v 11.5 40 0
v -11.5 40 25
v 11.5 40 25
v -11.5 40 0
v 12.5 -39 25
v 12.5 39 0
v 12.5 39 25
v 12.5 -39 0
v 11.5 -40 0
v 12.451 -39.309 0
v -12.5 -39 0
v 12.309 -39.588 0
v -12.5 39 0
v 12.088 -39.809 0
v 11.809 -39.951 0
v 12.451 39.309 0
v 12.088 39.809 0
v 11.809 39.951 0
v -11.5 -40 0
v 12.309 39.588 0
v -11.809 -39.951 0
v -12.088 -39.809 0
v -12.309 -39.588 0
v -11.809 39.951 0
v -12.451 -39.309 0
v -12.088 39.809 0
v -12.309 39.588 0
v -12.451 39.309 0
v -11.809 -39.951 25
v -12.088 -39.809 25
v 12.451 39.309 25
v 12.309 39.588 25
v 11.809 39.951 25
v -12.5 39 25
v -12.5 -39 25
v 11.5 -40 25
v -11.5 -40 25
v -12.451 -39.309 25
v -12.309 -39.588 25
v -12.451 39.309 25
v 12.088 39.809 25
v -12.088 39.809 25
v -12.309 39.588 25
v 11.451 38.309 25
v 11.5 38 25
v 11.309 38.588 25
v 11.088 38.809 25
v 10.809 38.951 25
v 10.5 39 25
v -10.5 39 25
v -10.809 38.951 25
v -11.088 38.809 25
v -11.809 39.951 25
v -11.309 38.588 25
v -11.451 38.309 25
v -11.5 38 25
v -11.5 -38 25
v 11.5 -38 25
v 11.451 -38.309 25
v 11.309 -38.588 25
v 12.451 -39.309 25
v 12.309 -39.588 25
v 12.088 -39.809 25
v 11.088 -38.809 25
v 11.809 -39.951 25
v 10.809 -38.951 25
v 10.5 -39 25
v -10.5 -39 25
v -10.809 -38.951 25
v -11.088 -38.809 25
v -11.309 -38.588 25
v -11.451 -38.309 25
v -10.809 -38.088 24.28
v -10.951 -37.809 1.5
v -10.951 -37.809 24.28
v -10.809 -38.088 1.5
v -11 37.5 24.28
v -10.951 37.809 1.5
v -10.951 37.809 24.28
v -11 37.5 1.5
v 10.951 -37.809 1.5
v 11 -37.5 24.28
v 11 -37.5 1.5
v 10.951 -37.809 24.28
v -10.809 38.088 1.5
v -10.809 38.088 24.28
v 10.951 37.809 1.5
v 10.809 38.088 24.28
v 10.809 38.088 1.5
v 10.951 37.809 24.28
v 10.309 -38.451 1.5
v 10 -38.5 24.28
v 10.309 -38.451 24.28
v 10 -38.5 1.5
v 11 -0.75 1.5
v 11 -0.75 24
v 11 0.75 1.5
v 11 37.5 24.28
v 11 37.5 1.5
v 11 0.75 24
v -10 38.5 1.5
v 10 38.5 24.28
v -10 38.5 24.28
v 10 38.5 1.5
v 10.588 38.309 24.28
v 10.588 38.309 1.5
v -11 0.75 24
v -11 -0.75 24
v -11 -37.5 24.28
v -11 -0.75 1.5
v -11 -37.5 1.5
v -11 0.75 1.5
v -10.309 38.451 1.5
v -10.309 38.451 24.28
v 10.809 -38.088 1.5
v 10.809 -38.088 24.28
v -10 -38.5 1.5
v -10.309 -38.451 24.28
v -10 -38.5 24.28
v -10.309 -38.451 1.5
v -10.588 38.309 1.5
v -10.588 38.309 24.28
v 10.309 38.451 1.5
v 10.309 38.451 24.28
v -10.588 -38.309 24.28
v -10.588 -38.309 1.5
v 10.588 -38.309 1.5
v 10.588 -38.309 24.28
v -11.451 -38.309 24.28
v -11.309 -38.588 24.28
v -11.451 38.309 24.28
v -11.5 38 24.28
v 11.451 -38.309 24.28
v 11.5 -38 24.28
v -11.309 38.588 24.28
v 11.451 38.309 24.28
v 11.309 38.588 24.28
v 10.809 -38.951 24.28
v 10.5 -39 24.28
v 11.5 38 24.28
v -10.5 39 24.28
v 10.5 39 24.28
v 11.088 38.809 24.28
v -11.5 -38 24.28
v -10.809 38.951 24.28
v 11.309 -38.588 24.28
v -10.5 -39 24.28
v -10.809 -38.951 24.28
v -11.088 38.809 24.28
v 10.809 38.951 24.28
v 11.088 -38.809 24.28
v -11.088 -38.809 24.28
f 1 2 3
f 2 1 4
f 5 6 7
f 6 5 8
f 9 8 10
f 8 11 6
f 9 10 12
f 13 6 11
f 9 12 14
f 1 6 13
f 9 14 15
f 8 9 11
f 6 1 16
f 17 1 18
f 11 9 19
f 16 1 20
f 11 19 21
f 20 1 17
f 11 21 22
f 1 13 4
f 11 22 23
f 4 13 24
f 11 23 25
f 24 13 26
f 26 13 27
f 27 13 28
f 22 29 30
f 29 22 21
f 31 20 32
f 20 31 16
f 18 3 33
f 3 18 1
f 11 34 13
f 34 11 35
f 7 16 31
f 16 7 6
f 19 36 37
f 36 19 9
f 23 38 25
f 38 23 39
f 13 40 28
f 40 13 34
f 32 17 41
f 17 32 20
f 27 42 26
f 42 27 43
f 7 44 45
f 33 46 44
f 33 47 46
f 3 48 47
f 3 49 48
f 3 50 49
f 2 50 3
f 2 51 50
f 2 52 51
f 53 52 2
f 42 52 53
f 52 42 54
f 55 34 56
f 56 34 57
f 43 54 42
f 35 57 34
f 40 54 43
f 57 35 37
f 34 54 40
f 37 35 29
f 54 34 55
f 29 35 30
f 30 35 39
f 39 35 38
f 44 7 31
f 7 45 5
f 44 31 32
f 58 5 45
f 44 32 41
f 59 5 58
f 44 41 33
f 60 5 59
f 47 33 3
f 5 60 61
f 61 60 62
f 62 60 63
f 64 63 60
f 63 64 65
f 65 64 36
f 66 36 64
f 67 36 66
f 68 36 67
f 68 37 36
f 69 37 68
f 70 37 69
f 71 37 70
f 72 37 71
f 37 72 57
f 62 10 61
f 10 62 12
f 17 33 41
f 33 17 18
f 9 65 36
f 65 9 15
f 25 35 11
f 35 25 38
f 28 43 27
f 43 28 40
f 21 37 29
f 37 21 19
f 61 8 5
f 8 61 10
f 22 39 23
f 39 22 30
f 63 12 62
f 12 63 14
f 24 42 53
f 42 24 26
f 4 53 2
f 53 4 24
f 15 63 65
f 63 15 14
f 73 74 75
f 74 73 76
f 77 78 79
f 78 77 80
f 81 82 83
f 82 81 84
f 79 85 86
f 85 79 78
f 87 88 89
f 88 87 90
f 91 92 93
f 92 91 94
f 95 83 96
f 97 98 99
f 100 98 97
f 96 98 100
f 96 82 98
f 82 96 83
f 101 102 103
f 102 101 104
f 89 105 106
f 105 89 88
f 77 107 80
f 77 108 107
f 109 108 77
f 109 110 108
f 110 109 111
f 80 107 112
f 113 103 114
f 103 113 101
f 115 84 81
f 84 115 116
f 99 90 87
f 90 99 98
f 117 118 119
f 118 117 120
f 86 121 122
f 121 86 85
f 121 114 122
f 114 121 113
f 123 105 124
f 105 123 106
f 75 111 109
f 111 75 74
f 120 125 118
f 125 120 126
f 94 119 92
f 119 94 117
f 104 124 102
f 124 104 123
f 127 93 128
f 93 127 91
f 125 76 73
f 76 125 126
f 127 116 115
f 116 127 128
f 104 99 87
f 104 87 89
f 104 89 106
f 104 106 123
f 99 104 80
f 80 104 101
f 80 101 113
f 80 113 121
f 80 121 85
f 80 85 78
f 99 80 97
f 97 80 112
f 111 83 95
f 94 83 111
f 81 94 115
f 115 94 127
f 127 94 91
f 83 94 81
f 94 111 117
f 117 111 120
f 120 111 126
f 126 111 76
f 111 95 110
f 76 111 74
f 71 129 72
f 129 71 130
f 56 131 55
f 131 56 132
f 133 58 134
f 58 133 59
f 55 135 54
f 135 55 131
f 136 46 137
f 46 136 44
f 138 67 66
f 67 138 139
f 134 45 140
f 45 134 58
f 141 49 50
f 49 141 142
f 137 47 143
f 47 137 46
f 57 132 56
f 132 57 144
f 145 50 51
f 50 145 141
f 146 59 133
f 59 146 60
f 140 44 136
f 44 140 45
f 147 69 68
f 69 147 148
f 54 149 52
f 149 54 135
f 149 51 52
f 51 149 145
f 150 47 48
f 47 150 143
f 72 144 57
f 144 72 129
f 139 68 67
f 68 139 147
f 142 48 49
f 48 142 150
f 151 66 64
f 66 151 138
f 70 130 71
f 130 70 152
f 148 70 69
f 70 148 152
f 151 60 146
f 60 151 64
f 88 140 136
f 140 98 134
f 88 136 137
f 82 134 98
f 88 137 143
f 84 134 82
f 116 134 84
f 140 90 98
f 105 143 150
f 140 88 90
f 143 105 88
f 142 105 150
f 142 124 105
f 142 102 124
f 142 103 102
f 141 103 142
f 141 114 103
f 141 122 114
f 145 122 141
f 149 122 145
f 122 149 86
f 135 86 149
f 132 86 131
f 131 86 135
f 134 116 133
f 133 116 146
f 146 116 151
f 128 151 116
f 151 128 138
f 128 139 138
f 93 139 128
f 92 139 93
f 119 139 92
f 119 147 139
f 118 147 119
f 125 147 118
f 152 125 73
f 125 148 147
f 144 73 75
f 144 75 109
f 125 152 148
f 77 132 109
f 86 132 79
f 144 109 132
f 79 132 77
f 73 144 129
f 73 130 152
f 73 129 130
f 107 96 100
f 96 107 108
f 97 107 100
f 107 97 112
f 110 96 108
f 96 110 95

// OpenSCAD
/**
A very simple box generator because I needed it
**/
$fn=20;

module using_hulls(){
    number_of_cylinders = 4;
    radius = 20;
    height=25;

    hull(){
        for (i = [1:number_of_cylinders]) {
            rotate(i * 360/number_of_cylinders)
                translate([100,100,0]) 
                    cylinder(r=radius, h=height);
        }
    }
}

//outside sizes for enclosure
box_width = 25;
box_lenght = 80;
box_height = 25;

// additional params
walls_multiplier=0.6; // thickness multiplier, make <1 for less thick, >1 for thick walls
corner_radius = 1;
wall_thickness = 2.5*walls_multiplier;
post_diameter=2;
hole_diameter=2;
lid_thickness =1.2*walls_multiplier;
lid_outer_extension=2*walls_multiplier;
lid_lip=1;
lid_tolerance=.1;
tolerance=.1;


module separators(y) {
    translate([(0 - box_width/2 + wall_thickness),y, lid_thickness]){
        cube([box_width - wall_thickness*2, wall_thickness, box_height - corner_radius-lid_thickness]);
    }
}
module posts(x, y, z, h, r) {
    translate([x,y,z]){
        cylinder(r = r, h=h);
    }
    
    translate([-x,y,z]){
        cylinder(r = r, h=h);
    }
    
    translate([-x,-y,z]){
        cylinder(r = r, h=h);
    }
   
    translate([x,-y,z]){
        cylinder(r = r, h=h);
    }
}
module enclosure(){
    difference(){
        //box
        color("red") hull(){
            posts(
                x=( box_width/2 - corner_radius),
                y=( box_lenght/2 - corner_radius),
                z=0,
                h=box_height,
                r=corner_radius
            );
        }

        //hollow part

        hull(){
            posts(
                x=( box_width/2 - corner_radius - wall_thickness),
                y=( box_lenght/2 - corner_radius - wall_thickness),
                z=wall_thickness,
                h=box_height,
                r=corner_radius
            );
        }
        //lip inside
        hull(){
            posts(
                x=( box_width/2 - corner_radius - lid_lip),
                y=( box_lenght/2 - corner_radius - lid_lip),
                z=(box_height-lid_thickness),
                h=lid_thickness+lid_tolerance*2,
                r=corner_radius
            );
        }
    }
}

module lid(){
    translate([0,0,5]) union(){

        hull(){
            posts(
                x=( box_width/2 - corner_radius - wall_thickness/2 - lid_tolerance),
                y=( box_lenght/2 - corner_radius - wall_thickness/2 - lid_tolerance),
                z=(box_height-lid_thickness),//5 is just to make it stick up so we can see it while working on the model
                h=lid_thickness,
                r=corner_radius
            );
        }
        //lid
        difference(){
            color("blue") hull(){
            posts(
                x=( box_width/2 - corner_radius - wall_thickness/2 + lid_outer_extension),
                y=( box_lenght/2 - corner_radius - wall_thickness/2 +lid_outer_extension),
                z=(box_height),//5 is just to make it stick up so we can see it while working on the model
                h=lid_thickness*2,
                r=corner_radius
            );
        }
        
    
        color("red") hull(){
            posts(
                x=( box_width/2 - corner_radius),
                y=( box_lenght/2 - corner_radius),
                z=(box_height+lid_thickness),
                h=lid_thickness*2,
                r=corner_radius
            );
        }
        }
        
    }
}
enclosure();

color("blue") separators(
    y= ( wall_thickness/2*-1)
);

/**color("blue") separators(
    y= ( wall_thickness/2*-1) - box_lenght/2
);
**/
/**
color("blue") separators(
    y= ( wall_thickness/2*-1) + box_lenght/2
);**/

//rotate([180,180,180]) translate([box_width*1.1,0,-box_height-lid_thickness*4]) lid();
